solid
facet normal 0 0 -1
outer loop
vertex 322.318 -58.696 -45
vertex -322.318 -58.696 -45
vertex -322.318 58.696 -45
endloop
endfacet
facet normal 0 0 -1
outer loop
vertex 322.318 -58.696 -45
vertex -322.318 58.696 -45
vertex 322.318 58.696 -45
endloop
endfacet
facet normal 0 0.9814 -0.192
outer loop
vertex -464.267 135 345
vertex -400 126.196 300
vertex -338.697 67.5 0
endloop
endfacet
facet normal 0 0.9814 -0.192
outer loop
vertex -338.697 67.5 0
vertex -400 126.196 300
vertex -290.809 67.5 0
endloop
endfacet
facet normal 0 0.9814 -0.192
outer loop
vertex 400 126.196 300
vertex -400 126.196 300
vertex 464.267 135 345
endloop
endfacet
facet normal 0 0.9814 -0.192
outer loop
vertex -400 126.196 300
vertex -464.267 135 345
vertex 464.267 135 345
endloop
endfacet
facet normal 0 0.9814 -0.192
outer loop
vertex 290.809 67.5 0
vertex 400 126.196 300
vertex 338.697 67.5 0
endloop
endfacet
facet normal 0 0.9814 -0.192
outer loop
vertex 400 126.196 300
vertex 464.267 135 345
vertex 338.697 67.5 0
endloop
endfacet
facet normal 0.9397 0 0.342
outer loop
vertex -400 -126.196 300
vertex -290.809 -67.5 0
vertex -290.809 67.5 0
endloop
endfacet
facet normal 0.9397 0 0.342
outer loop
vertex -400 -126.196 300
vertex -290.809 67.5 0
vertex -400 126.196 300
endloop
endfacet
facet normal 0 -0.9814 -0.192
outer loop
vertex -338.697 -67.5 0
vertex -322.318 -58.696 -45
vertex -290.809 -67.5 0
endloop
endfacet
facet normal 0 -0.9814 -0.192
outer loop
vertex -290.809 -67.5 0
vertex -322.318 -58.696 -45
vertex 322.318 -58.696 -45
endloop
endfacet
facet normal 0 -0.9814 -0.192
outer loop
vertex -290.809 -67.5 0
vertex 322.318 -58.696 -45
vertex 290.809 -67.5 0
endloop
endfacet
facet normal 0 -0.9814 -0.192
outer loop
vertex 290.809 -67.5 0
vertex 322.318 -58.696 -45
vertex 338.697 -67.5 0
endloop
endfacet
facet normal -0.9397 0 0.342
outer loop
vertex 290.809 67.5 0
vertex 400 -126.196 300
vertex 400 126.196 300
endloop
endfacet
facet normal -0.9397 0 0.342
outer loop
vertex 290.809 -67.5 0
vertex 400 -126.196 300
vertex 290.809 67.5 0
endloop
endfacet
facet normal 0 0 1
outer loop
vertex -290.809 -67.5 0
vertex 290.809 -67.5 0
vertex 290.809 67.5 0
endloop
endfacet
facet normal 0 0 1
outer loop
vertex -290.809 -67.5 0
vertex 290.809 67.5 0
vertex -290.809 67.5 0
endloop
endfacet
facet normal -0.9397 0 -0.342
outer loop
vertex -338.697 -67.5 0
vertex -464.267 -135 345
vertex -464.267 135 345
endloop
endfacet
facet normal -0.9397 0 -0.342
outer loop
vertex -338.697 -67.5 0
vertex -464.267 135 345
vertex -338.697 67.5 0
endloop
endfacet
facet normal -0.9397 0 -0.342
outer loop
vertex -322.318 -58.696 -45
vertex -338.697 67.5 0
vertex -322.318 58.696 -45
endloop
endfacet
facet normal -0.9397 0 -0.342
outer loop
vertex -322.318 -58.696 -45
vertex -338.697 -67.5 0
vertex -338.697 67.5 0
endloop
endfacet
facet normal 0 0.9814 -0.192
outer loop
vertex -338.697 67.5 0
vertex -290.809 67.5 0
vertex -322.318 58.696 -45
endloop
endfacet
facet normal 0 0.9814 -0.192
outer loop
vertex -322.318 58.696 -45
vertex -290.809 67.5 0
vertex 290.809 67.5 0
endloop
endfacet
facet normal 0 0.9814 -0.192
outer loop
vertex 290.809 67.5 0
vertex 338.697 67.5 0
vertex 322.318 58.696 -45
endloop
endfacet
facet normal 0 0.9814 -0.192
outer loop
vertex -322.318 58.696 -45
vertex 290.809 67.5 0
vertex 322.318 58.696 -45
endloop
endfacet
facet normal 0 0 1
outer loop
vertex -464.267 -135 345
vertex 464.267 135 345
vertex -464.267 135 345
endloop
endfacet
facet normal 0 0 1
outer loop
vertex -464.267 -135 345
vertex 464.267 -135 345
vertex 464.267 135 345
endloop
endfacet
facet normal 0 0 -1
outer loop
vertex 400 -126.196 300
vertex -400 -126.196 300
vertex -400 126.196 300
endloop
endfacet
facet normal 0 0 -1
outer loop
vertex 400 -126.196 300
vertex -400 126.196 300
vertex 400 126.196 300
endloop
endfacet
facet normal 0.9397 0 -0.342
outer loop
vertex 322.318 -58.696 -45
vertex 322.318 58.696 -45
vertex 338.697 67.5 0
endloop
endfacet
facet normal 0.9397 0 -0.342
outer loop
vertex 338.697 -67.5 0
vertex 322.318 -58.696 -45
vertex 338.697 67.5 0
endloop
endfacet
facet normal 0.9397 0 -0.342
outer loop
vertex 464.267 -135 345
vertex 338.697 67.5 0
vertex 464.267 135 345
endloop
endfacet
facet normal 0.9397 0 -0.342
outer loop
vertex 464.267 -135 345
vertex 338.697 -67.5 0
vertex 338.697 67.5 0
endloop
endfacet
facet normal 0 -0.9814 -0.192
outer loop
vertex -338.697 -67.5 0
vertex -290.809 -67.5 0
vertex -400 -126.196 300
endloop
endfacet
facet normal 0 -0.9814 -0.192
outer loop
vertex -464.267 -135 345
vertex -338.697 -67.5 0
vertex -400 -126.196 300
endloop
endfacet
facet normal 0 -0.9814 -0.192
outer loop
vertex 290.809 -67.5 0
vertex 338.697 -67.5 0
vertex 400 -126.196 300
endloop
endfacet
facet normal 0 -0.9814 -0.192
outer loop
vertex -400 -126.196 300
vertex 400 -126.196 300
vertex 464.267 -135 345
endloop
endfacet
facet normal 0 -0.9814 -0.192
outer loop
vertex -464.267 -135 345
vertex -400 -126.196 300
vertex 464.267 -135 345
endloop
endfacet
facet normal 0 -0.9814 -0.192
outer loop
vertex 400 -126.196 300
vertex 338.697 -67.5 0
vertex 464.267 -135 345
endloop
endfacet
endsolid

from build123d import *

# Parameters (mm, degrees)
F1_DEPTH = 135
F3_DEPTH = 500


with BuildPart() as f1:
    # F0 (on Front) → F1 (new body, symmetric)
    with BuildSketch(Plane.XZ):
        Polygon((464.26666, 345), (-464.26666, 345), (-322.318269, -45), (322.318269, -45), align=None)
        Polygon((290.80893, 0), (-290.80893, 0), (-400, 300), (400, 300), align=None, mode=Mode.SUBTRACT)
    extrude(amount=F1_DEPTH, both=True)

    # F2 (on Right) → F3 (cut, symmetric)
    with BuildSketch(Plane.YZ):
        Polygon((-67.5, 0), (-135, 345), (135, 345), (67.5, 0), (56.686841, -55.267259), (427.661182, -55.267259), (427.661182, 496.46467), (-274.209738, 496.46467), (-274.209738, -50), (-57.717391, -50), align=None)
    extrude(amount=F3_DEPTH, both=True, mode=Mode.SUBTRACT)


solid = f1.part
